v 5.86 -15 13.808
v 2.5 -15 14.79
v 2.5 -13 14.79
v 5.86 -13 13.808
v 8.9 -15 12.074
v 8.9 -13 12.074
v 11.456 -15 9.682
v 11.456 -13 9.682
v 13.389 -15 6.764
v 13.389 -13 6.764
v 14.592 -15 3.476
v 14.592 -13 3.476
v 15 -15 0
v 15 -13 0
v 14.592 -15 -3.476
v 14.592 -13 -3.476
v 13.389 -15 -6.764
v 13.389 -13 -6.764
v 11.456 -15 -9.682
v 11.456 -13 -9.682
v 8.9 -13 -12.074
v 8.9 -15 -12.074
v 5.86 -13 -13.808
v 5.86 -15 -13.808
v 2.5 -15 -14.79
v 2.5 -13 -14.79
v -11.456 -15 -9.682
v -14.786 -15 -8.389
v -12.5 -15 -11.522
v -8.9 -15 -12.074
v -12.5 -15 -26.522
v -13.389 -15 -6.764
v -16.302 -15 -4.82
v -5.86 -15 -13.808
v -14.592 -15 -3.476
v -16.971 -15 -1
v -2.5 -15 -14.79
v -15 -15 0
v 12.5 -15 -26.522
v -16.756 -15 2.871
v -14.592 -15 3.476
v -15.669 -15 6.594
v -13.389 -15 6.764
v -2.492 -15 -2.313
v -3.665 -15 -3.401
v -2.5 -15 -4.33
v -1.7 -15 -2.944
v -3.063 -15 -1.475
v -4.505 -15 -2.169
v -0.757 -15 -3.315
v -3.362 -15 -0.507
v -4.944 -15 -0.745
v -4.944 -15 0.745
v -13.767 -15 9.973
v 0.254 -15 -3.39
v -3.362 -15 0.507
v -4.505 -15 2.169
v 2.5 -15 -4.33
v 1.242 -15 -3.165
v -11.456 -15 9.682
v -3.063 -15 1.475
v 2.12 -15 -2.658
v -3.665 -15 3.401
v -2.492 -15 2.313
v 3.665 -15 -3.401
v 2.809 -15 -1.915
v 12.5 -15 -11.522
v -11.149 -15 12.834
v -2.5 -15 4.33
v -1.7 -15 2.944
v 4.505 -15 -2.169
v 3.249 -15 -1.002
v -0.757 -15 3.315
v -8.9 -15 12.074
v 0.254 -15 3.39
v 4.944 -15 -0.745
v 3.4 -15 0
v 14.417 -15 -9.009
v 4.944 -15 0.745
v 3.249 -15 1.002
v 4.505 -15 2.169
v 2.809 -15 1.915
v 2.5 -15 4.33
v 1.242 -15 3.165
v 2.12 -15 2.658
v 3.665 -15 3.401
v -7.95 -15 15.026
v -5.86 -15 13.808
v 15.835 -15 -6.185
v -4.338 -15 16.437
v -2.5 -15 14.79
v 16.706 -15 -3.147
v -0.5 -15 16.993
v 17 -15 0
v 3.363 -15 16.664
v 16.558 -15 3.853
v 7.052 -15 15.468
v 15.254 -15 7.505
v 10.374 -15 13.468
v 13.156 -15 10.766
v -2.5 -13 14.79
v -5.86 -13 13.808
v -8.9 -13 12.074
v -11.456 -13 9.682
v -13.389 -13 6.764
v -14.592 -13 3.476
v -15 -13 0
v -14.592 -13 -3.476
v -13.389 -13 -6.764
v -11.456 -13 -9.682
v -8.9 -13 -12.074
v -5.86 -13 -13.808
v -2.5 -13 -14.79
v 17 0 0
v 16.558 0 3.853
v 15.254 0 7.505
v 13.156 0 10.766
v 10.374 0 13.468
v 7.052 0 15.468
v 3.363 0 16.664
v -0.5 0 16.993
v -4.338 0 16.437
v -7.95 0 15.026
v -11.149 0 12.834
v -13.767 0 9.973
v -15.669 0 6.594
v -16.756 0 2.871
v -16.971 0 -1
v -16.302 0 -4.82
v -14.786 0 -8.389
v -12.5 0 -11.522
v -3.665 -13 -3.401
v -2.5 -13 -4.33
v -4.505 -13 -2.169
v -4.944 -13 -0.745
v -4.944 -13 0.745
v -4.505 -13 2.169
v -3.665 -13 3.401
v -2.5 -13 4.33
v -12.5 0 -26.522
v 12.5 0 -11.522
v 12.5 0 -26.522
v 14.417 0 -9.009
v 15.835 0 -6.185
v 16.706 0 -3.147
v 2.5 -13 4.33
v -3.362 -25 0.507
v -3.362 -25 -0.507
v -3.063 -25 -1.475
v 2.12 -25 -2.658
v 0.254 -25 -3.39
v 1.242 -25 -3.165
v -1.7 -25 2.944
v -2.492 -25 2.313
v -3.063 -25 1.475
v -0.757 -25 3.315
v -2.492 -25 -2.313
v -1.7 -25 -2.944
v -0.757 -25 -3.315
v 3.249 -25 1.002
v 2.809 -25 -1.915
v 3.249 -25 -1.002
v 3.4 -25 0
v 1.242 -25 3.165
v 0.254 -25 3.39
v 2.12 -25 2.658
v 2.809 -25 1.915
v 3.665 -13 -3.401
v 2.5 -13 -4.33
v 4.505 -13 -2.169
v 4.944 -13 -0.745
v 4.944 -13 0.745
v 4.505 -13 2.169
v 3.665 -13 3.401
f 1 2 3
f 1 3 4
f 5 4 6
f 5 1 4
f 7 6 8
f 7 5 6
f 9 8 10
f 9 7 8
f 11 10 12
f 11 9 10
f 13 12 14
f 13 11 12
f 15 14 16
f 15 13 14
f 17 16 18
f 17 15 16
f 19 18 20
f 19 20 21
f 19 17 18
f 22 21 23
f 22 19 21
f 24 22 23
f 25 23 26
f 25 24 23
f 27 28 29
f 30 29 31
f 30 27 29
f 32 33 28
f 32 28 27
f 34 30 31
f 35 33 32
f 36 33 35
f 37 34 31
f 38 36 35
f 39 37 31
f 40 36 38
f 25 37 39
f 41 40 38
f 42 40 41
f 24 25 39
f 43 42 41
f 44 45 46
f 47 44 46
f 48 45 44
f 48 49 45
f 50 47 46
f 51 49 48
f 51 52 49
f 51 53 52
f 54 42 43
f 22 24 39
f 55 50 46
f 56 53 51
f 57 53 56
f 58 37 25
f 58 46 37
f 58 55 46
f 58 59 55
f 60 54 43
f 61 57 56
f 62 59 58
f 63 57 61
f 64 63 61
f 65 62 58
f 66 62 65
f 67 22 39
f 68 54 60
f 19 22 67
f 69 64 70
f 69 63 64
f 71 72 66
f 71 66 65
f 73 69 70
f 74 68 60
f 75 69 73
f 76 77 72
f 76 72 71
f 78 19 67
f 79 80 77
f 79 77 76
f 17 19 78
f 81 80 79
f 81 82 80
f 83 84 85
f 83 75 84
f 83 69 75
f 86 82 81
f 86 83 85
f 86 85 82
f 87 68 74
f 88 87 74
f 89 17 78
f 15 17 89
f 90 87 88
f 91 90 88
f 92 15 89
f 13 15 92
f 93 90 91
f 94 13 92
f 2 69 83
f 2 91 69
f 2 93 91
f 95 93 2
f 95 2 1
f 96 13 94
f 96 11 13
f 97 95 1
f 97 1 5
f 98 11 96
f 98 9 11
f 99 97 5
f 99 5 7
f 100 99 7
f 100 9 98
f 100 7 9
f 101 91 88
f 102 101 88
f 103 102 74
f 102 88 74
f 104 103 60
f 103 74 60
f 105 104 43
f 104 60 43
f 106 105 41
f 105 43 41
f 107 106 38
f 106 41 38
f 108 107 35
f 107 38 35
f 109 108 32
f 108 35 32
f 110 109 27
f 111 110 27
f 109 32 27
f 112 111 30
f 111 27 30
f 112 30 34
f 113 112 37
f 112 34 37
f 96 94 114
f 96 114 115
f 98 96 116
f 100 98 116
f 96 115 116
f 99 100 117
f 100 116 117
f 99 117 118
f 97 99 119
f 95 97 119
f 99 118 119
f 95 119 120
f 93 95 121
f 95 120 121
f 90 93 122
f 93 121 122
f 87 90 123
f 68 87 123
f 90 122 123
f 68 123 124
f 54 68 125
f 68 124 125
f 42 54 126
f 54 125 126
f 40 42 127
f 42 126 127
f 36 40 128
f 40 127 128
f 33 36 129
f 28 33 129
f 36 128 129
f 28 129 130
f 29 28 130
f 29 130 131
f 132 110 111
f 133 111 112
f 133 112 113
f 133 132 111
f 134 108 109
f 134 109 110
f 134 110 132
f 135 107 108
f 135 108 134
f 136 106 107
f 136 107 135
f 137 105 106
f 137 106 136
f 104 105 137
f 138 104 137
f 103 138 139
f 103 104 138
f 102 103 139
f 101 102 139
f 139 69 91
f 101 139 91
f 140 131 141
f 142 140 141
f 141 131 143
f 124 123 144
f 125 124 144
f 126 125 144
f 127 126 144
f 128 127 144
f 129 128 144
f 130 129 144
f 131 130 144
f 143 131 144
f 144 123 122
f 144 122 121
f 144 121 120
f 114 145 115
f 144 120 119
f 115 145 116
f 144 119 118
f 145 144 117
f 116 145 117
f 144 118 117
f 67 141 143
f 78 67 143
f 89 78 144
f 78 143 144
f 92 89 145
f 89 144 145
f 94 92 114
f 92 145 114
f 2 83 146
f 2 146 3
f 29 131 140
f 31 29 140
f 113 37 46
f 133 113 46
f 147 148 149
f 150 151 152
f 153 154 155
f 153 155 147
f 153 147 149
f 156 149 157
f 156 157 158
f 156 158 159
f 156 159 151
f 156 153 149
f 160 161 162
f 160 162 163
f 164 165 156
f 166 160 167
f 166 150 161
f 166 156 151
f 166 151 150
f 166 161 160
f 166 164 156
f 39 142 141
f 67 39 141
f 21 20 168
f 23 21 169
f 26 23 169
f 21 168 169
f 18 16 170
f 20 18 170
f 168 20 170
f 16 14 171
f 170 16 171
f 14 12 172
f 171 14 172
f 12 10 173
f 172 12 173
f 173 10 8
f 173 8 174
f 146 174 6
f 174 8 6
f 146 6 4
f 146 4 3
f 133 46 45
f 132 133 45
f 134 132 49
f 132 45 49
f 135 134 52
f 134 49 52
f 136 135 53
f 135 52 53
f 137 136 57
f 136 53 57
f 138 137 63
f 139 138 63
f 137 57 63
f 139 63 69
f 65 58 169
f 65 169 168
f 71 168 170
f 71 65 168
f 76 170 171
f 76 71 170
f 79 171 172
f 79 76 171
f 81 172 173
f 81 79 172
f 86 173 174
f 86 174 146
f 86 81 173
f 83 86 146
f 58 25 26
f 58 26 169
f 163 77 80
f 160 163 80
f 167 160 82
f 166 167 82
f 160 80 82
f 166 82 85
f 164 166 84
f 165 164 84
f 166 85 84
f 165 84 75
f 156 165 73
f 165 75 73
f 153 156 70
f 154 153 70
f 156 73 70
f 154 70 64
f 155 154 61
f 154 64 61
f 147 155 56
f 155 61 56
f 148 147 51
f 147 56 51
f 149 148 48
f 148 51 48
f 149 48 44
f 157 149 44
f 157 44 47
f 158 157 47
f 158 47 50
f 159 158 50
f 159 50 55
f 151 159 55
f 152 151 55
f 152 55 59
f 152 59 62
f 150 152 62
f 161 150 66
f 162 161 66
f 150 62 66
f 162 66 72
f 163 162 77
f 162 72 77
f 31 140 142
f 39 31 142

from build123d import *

# Parameters (mm, degrees)
F1_DEPTH = 15
F3_DEPTH = 2
F4_R     = 3.4
F5_DEPTH = 10


# Not quite as in the source:
# - a feature of the source that left no trace in its solid (it failed there, or was rolled back) is left out
# - a pattern or mirror of a feature is missing from the dataset's text; its kind, count and spacing are read off the source's solid


with BuildPart() as f1:
    # F0 (on Front) → F1 (new body)
    with BuildSketch(Plane.XZ):
        with BuildLine():
            ThreePointArc((12.5, -11.5217186218), (15.8350876221, -6.1846584384), (17, 0))
            ThreePointArc((17, 0), (-6.1846584384, 15.8350876221), (-12.5, -11.5217186218))
            ThreePointArc((-12.5, -11.5217186218), (0, -17), (12.5, -11.5217186218))
        make_face()
        with BuildLine():
            ThreePointArc((12.5, -11.5217186218), (0, -17), (-12.5, -11.5217186218))
            Line((-12.5, -11.5217186218), (-12.5, -26.5217186218))
            Line((-12.5, -26.5217186218), (12.5, -26.5217186218))
            Line((12.5, -26.5217186218), (12.5, -11.5217186218))
        make_face()
    extrude(amount=F1_DEPTH)

    # F2 (on face) → F3 (cut)
    with BuildSketch(Plane.XZ.offset(15)):
        with BuildLine():
            Line((-2.5, 4.3301270189), (-2.5, 14.7901994577))
            ThreePointArc((-2.5, 14.7901994577), (-15, 0), (-2.5, -14.7901994577))
            Line((-2.5, -14.7901994577), (-2.5, -4.3301270189))
            ThreePointArc((-2.5, -4.3301270189), (-5, 0), (-2.5, 4.3301270189))
        make_face()
    f3 = extrude(amount=-F3_DEPTH, mode=Mode.SUBTRACT)

    # F3_copies: F3 across plane
    add(f3.mirror(Plane(origin=(0, 0, 0), x_dir=(0, 0, 1), z_dir=(1, 0, 0))), mode=Mode.SUBTRACT)

    # F4 (on face) → F5 (join)
    with BuildSketch(Plane.XZ.offset(15)):
        Circle(F4_R)
    extrude(amount=F5_DEPTH)


solid = f1.part
